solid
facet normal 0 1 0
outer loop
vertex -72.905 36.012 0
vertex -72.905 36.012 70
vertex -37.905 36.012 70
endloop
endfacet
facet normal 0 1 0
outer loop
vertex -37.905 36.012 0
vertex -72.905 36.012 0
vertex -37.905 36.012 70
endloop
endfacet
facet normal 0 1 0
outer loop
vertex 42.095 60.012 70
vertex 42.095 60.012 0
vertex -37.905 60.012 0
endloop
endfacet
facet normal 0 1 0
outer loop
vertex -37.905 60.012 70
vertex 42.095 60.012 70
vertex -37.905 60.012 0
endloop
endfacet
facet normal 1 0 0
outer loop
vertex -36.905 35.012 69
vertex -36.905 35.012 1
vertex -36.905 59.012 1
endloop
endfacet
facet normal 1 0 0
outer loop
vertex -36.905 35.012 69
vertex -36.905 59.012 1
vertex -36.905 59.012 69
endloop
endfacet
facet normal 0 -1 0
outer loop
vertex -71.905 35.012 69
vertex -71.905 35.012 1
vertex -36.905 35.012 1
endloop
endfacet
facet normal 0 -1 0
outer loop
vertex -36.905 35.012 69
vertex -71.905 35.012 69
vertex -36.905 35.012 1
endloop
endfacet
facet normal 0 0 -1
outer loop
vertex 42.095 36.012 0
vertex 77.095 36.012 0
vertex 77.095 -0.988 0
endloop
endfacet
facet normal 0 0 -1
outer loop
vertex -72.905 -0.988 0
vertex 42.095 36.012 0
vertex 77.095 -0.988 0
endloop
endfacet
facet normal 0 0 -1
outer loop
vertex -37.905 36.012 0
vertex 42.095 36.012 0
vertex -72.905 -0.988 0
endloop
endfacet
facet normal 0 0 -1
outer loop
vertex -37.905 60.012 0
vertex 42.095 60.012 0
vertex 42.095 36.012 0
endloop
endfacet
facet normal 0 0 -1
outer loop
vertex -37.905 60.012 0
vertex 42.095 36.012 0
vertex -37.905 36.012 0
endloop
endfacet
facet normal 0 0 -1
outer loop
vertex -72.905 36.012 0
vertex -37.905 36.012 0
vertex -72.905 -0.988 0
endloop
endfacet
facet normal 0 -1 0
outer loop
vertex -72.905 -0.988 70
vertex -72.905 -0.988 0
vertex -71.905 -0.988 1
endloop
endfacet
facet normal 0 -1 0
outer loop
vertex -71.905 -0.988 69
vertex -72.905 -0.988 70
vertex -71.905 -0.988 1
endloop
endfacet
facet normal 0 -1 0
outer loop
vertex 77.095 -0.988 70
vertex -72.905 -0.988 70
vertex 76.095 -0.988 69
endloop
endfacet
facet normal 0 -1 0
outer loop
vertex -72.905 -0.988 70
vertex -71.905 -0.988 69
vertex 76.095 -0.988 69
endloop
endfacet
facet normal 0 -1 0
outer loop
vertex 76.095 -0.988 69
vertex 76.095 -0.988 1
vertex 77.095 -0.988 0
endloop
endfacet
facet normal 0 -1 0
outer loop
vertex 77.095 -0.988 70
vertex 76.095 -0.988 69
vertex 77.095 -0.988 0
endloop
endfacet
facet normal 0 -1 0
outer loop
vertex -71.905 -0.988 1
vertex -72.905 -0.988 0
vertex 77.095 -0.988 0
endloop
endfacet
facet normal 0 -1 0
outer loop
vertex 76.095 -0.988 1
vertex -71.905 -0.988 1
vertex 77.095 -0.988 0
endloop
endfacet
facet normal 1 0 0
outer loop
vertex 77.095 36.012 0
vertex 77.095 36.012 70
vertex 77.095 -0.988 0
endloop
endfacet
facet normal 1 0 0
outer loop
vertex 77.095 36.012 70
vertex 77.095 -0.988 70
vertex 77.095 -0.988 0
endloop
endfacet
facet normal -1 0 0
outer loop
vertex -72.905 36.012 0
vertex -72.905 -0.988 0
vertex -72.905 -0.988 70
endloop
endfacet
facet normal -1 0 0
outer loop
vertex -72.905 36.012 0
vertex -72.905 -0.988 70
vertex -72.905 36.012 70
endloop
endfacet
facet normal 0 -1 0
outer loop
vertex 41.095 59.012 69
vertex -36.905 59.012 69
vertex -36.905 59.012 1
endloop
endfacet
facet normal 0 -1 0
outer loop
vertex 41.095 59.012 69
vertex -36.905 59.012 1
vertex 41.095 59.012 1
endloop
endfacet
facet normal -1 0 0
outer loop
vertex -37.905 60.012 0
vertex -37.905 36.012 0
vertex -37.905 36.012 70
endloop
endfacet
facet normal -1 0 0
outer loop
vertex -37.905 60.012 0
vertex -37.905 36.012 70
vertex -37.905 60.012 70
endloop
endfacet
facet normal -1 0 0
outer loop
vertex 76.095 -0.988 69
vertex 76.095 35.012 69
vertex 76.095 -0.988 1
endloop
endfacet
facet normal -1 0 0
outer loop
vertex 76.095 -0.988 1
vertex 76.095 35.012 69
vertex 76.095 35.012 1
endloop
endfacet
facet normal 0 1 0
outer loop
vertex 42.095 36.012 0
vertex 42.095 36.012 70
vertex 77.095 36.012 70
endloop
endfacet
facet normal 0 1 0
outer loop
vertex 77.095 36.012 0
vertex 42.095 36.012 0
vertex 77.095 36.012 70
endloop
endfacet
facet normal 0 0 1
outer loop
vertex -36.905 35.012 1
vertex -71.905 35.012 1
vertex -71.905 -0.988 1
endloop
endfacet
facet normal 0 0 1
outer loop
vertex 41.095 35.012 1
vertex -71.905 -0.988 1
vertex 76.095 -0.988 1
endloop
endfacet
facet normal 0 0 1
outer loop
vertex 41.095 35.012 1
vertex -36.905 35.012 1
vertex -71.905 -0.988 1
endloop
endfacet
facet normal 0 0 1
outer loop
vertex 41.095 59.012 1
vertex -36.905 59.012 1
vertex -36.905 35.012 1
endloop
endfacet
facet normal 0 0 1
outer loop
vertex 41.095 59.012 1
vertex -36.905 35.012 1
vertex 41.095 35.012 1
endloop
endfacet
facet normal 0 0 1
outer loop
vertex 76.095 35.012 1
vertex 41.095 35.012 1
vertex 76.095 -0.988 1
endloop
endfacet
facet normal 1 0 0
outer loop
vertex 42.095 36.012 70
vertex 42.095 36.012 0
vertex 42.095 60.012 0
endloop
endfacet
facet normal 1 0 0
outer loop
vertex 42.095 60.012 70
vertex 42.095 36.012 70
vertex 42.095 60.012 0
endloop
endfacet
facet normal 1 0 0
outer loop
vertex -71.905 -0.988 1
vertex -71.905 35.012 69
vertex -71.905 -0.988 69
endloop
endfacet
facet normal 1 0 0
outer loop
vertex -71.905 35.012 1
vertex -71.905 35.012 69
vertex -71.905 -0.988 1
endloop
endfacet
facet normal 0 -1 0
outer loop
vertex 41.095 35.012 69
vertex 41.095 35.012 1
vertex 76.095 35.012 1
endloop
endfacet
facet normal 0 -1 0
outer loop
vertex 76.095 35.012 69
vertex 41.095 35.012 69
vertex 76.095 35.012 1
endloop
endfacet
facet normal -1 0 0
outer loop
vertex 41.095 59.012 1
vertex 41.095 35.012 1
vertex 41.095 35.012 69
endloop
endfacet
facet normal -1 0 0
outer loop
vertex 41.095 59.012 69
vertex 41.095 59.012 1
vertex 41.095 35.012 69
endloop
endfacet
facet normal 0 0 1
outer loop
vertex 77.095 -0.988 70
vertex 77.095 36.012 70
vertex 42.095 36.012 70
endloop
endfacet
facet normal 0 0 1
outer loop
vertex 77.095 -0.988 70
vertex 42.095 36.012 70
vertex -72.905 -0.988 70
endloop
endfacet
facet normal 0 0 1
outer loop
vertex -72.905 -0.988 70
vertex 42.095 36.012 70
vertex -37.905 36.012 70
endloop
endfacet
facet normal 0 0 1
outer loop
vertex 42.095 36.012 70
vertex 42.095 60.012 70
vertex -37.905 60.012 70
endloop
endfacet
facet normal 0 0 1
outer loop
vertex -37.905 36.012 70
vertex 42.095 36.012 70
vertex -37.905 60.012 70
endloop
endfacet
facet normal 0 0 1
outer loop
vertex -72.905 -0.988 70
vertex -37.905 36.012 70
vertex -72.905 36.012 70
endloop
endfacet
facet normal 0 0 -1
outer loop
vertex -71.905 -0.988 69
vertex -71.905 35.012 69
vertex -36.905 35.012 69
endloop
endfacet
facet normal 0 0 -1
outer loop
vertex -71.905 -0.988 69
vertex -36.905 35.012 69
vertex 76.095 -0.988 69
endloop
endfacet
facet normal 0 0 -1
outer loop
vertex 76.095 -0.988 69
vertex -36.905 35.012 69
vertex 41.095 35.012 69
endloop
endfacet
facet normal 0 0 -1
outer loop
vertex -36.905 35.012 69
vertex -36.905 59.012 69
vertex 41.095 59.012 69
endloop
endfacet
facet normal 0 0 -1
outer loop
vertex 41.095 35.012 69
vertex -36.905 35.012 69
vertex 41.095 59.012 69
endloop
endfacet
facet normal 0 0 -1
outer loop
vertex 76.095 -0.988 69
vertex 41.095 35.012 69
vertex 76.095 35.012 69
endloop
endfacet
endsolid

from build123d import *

# Parameters (mm, degrees)
SKETCH1_W           = 150
SKETCH1_H           = 36
BOSS_EXTRUDE1_DEPTH = 70
SKETCH3_W           = 148
SKETCH3_H           = 68
CUT_EXTRUDE1_DEPTH  = 111.180351821
SKETCH4_W           = 35
SKETCH4_H           = 70
BOSS_EXTRUDE3_DEPTH = 1
SKETCH5_W           = 80
SKETCH5_H           = 25
BOSS_EXTRUDE4_DEPTH = 70
SKETCH6_W           = 78
SKETCH6_H           = 68
CUT_EXTRUDE2_DEPTH  = 24


with BuildPart() as part:
    # Sketch1 → Boss-Extrude1 (new body)
    with BuildSketch(Plane.XY):
        with Locations((2.095459837, 17.011641444)):
            Rectangle(SKETCH1_W, SKETCH1_H)
    extrude(amount=BOSS_EXTRUDE1_DEPTH)

    # Sketch3 → Cut-Extrude1 (cut, through all)
    with BuildSketch(Plane(origin=(0, 35.011641444, 0), x_dir=(1, 0, 0), z_dir=(0, 1, 0))):
        with Locations((2.095459837, -35)):
            Rectangle(SKETCH3_W, SKETCH3_H)
    extrude(amount=-CUT_EXTRUDE1_DEPTH, mode=Mode.SUBTRACT)

    # Sketch4 → Boss-Extrude3 (add)
    with BuildSketch(Plane(origin=(0, 35.011641444, 0), x_dir=(1, 0, 0), z_dir=(0, 1, 0))):
        with Locations((59.595459837, -35)):
            Rectangle(SKETCH4_W, SKETCH4_H)
        with Locations((-55.404540163, -35)):
            Rectangle(SKETCH4_W, SKETCH4_H)
    extrude(amount=BOSS_EXTRUDE3_DEPTH)

    # Sketch5 → Boss-Extrude4 (add)
    with BuildSketch(Plane(origin=(0, 0, 0), x_dir=(-1, 0, 0), z_dir=(0, 0, -1))):
        with Locations((-2.095459837, 47.511641444)):
            Rectangle(SKETCH5_W, SKETCH5_H)
    extrude(amount=-BOSS_EXTRUDE4_DEPTH)

    # Sketch6 → Cut-Extrude2 (cut)
    with BuildSketch(Plane.XZ.offset(-35.011641444)):
        with Locations((2.095459837, 35)):
            Rectangle(SKETCH6_W, SKETCH6_H)
    extrude(amount=-CUT_EXTRUDE2_DEPTH, mode=Mode.SUBTRACT)


solid = part.part
